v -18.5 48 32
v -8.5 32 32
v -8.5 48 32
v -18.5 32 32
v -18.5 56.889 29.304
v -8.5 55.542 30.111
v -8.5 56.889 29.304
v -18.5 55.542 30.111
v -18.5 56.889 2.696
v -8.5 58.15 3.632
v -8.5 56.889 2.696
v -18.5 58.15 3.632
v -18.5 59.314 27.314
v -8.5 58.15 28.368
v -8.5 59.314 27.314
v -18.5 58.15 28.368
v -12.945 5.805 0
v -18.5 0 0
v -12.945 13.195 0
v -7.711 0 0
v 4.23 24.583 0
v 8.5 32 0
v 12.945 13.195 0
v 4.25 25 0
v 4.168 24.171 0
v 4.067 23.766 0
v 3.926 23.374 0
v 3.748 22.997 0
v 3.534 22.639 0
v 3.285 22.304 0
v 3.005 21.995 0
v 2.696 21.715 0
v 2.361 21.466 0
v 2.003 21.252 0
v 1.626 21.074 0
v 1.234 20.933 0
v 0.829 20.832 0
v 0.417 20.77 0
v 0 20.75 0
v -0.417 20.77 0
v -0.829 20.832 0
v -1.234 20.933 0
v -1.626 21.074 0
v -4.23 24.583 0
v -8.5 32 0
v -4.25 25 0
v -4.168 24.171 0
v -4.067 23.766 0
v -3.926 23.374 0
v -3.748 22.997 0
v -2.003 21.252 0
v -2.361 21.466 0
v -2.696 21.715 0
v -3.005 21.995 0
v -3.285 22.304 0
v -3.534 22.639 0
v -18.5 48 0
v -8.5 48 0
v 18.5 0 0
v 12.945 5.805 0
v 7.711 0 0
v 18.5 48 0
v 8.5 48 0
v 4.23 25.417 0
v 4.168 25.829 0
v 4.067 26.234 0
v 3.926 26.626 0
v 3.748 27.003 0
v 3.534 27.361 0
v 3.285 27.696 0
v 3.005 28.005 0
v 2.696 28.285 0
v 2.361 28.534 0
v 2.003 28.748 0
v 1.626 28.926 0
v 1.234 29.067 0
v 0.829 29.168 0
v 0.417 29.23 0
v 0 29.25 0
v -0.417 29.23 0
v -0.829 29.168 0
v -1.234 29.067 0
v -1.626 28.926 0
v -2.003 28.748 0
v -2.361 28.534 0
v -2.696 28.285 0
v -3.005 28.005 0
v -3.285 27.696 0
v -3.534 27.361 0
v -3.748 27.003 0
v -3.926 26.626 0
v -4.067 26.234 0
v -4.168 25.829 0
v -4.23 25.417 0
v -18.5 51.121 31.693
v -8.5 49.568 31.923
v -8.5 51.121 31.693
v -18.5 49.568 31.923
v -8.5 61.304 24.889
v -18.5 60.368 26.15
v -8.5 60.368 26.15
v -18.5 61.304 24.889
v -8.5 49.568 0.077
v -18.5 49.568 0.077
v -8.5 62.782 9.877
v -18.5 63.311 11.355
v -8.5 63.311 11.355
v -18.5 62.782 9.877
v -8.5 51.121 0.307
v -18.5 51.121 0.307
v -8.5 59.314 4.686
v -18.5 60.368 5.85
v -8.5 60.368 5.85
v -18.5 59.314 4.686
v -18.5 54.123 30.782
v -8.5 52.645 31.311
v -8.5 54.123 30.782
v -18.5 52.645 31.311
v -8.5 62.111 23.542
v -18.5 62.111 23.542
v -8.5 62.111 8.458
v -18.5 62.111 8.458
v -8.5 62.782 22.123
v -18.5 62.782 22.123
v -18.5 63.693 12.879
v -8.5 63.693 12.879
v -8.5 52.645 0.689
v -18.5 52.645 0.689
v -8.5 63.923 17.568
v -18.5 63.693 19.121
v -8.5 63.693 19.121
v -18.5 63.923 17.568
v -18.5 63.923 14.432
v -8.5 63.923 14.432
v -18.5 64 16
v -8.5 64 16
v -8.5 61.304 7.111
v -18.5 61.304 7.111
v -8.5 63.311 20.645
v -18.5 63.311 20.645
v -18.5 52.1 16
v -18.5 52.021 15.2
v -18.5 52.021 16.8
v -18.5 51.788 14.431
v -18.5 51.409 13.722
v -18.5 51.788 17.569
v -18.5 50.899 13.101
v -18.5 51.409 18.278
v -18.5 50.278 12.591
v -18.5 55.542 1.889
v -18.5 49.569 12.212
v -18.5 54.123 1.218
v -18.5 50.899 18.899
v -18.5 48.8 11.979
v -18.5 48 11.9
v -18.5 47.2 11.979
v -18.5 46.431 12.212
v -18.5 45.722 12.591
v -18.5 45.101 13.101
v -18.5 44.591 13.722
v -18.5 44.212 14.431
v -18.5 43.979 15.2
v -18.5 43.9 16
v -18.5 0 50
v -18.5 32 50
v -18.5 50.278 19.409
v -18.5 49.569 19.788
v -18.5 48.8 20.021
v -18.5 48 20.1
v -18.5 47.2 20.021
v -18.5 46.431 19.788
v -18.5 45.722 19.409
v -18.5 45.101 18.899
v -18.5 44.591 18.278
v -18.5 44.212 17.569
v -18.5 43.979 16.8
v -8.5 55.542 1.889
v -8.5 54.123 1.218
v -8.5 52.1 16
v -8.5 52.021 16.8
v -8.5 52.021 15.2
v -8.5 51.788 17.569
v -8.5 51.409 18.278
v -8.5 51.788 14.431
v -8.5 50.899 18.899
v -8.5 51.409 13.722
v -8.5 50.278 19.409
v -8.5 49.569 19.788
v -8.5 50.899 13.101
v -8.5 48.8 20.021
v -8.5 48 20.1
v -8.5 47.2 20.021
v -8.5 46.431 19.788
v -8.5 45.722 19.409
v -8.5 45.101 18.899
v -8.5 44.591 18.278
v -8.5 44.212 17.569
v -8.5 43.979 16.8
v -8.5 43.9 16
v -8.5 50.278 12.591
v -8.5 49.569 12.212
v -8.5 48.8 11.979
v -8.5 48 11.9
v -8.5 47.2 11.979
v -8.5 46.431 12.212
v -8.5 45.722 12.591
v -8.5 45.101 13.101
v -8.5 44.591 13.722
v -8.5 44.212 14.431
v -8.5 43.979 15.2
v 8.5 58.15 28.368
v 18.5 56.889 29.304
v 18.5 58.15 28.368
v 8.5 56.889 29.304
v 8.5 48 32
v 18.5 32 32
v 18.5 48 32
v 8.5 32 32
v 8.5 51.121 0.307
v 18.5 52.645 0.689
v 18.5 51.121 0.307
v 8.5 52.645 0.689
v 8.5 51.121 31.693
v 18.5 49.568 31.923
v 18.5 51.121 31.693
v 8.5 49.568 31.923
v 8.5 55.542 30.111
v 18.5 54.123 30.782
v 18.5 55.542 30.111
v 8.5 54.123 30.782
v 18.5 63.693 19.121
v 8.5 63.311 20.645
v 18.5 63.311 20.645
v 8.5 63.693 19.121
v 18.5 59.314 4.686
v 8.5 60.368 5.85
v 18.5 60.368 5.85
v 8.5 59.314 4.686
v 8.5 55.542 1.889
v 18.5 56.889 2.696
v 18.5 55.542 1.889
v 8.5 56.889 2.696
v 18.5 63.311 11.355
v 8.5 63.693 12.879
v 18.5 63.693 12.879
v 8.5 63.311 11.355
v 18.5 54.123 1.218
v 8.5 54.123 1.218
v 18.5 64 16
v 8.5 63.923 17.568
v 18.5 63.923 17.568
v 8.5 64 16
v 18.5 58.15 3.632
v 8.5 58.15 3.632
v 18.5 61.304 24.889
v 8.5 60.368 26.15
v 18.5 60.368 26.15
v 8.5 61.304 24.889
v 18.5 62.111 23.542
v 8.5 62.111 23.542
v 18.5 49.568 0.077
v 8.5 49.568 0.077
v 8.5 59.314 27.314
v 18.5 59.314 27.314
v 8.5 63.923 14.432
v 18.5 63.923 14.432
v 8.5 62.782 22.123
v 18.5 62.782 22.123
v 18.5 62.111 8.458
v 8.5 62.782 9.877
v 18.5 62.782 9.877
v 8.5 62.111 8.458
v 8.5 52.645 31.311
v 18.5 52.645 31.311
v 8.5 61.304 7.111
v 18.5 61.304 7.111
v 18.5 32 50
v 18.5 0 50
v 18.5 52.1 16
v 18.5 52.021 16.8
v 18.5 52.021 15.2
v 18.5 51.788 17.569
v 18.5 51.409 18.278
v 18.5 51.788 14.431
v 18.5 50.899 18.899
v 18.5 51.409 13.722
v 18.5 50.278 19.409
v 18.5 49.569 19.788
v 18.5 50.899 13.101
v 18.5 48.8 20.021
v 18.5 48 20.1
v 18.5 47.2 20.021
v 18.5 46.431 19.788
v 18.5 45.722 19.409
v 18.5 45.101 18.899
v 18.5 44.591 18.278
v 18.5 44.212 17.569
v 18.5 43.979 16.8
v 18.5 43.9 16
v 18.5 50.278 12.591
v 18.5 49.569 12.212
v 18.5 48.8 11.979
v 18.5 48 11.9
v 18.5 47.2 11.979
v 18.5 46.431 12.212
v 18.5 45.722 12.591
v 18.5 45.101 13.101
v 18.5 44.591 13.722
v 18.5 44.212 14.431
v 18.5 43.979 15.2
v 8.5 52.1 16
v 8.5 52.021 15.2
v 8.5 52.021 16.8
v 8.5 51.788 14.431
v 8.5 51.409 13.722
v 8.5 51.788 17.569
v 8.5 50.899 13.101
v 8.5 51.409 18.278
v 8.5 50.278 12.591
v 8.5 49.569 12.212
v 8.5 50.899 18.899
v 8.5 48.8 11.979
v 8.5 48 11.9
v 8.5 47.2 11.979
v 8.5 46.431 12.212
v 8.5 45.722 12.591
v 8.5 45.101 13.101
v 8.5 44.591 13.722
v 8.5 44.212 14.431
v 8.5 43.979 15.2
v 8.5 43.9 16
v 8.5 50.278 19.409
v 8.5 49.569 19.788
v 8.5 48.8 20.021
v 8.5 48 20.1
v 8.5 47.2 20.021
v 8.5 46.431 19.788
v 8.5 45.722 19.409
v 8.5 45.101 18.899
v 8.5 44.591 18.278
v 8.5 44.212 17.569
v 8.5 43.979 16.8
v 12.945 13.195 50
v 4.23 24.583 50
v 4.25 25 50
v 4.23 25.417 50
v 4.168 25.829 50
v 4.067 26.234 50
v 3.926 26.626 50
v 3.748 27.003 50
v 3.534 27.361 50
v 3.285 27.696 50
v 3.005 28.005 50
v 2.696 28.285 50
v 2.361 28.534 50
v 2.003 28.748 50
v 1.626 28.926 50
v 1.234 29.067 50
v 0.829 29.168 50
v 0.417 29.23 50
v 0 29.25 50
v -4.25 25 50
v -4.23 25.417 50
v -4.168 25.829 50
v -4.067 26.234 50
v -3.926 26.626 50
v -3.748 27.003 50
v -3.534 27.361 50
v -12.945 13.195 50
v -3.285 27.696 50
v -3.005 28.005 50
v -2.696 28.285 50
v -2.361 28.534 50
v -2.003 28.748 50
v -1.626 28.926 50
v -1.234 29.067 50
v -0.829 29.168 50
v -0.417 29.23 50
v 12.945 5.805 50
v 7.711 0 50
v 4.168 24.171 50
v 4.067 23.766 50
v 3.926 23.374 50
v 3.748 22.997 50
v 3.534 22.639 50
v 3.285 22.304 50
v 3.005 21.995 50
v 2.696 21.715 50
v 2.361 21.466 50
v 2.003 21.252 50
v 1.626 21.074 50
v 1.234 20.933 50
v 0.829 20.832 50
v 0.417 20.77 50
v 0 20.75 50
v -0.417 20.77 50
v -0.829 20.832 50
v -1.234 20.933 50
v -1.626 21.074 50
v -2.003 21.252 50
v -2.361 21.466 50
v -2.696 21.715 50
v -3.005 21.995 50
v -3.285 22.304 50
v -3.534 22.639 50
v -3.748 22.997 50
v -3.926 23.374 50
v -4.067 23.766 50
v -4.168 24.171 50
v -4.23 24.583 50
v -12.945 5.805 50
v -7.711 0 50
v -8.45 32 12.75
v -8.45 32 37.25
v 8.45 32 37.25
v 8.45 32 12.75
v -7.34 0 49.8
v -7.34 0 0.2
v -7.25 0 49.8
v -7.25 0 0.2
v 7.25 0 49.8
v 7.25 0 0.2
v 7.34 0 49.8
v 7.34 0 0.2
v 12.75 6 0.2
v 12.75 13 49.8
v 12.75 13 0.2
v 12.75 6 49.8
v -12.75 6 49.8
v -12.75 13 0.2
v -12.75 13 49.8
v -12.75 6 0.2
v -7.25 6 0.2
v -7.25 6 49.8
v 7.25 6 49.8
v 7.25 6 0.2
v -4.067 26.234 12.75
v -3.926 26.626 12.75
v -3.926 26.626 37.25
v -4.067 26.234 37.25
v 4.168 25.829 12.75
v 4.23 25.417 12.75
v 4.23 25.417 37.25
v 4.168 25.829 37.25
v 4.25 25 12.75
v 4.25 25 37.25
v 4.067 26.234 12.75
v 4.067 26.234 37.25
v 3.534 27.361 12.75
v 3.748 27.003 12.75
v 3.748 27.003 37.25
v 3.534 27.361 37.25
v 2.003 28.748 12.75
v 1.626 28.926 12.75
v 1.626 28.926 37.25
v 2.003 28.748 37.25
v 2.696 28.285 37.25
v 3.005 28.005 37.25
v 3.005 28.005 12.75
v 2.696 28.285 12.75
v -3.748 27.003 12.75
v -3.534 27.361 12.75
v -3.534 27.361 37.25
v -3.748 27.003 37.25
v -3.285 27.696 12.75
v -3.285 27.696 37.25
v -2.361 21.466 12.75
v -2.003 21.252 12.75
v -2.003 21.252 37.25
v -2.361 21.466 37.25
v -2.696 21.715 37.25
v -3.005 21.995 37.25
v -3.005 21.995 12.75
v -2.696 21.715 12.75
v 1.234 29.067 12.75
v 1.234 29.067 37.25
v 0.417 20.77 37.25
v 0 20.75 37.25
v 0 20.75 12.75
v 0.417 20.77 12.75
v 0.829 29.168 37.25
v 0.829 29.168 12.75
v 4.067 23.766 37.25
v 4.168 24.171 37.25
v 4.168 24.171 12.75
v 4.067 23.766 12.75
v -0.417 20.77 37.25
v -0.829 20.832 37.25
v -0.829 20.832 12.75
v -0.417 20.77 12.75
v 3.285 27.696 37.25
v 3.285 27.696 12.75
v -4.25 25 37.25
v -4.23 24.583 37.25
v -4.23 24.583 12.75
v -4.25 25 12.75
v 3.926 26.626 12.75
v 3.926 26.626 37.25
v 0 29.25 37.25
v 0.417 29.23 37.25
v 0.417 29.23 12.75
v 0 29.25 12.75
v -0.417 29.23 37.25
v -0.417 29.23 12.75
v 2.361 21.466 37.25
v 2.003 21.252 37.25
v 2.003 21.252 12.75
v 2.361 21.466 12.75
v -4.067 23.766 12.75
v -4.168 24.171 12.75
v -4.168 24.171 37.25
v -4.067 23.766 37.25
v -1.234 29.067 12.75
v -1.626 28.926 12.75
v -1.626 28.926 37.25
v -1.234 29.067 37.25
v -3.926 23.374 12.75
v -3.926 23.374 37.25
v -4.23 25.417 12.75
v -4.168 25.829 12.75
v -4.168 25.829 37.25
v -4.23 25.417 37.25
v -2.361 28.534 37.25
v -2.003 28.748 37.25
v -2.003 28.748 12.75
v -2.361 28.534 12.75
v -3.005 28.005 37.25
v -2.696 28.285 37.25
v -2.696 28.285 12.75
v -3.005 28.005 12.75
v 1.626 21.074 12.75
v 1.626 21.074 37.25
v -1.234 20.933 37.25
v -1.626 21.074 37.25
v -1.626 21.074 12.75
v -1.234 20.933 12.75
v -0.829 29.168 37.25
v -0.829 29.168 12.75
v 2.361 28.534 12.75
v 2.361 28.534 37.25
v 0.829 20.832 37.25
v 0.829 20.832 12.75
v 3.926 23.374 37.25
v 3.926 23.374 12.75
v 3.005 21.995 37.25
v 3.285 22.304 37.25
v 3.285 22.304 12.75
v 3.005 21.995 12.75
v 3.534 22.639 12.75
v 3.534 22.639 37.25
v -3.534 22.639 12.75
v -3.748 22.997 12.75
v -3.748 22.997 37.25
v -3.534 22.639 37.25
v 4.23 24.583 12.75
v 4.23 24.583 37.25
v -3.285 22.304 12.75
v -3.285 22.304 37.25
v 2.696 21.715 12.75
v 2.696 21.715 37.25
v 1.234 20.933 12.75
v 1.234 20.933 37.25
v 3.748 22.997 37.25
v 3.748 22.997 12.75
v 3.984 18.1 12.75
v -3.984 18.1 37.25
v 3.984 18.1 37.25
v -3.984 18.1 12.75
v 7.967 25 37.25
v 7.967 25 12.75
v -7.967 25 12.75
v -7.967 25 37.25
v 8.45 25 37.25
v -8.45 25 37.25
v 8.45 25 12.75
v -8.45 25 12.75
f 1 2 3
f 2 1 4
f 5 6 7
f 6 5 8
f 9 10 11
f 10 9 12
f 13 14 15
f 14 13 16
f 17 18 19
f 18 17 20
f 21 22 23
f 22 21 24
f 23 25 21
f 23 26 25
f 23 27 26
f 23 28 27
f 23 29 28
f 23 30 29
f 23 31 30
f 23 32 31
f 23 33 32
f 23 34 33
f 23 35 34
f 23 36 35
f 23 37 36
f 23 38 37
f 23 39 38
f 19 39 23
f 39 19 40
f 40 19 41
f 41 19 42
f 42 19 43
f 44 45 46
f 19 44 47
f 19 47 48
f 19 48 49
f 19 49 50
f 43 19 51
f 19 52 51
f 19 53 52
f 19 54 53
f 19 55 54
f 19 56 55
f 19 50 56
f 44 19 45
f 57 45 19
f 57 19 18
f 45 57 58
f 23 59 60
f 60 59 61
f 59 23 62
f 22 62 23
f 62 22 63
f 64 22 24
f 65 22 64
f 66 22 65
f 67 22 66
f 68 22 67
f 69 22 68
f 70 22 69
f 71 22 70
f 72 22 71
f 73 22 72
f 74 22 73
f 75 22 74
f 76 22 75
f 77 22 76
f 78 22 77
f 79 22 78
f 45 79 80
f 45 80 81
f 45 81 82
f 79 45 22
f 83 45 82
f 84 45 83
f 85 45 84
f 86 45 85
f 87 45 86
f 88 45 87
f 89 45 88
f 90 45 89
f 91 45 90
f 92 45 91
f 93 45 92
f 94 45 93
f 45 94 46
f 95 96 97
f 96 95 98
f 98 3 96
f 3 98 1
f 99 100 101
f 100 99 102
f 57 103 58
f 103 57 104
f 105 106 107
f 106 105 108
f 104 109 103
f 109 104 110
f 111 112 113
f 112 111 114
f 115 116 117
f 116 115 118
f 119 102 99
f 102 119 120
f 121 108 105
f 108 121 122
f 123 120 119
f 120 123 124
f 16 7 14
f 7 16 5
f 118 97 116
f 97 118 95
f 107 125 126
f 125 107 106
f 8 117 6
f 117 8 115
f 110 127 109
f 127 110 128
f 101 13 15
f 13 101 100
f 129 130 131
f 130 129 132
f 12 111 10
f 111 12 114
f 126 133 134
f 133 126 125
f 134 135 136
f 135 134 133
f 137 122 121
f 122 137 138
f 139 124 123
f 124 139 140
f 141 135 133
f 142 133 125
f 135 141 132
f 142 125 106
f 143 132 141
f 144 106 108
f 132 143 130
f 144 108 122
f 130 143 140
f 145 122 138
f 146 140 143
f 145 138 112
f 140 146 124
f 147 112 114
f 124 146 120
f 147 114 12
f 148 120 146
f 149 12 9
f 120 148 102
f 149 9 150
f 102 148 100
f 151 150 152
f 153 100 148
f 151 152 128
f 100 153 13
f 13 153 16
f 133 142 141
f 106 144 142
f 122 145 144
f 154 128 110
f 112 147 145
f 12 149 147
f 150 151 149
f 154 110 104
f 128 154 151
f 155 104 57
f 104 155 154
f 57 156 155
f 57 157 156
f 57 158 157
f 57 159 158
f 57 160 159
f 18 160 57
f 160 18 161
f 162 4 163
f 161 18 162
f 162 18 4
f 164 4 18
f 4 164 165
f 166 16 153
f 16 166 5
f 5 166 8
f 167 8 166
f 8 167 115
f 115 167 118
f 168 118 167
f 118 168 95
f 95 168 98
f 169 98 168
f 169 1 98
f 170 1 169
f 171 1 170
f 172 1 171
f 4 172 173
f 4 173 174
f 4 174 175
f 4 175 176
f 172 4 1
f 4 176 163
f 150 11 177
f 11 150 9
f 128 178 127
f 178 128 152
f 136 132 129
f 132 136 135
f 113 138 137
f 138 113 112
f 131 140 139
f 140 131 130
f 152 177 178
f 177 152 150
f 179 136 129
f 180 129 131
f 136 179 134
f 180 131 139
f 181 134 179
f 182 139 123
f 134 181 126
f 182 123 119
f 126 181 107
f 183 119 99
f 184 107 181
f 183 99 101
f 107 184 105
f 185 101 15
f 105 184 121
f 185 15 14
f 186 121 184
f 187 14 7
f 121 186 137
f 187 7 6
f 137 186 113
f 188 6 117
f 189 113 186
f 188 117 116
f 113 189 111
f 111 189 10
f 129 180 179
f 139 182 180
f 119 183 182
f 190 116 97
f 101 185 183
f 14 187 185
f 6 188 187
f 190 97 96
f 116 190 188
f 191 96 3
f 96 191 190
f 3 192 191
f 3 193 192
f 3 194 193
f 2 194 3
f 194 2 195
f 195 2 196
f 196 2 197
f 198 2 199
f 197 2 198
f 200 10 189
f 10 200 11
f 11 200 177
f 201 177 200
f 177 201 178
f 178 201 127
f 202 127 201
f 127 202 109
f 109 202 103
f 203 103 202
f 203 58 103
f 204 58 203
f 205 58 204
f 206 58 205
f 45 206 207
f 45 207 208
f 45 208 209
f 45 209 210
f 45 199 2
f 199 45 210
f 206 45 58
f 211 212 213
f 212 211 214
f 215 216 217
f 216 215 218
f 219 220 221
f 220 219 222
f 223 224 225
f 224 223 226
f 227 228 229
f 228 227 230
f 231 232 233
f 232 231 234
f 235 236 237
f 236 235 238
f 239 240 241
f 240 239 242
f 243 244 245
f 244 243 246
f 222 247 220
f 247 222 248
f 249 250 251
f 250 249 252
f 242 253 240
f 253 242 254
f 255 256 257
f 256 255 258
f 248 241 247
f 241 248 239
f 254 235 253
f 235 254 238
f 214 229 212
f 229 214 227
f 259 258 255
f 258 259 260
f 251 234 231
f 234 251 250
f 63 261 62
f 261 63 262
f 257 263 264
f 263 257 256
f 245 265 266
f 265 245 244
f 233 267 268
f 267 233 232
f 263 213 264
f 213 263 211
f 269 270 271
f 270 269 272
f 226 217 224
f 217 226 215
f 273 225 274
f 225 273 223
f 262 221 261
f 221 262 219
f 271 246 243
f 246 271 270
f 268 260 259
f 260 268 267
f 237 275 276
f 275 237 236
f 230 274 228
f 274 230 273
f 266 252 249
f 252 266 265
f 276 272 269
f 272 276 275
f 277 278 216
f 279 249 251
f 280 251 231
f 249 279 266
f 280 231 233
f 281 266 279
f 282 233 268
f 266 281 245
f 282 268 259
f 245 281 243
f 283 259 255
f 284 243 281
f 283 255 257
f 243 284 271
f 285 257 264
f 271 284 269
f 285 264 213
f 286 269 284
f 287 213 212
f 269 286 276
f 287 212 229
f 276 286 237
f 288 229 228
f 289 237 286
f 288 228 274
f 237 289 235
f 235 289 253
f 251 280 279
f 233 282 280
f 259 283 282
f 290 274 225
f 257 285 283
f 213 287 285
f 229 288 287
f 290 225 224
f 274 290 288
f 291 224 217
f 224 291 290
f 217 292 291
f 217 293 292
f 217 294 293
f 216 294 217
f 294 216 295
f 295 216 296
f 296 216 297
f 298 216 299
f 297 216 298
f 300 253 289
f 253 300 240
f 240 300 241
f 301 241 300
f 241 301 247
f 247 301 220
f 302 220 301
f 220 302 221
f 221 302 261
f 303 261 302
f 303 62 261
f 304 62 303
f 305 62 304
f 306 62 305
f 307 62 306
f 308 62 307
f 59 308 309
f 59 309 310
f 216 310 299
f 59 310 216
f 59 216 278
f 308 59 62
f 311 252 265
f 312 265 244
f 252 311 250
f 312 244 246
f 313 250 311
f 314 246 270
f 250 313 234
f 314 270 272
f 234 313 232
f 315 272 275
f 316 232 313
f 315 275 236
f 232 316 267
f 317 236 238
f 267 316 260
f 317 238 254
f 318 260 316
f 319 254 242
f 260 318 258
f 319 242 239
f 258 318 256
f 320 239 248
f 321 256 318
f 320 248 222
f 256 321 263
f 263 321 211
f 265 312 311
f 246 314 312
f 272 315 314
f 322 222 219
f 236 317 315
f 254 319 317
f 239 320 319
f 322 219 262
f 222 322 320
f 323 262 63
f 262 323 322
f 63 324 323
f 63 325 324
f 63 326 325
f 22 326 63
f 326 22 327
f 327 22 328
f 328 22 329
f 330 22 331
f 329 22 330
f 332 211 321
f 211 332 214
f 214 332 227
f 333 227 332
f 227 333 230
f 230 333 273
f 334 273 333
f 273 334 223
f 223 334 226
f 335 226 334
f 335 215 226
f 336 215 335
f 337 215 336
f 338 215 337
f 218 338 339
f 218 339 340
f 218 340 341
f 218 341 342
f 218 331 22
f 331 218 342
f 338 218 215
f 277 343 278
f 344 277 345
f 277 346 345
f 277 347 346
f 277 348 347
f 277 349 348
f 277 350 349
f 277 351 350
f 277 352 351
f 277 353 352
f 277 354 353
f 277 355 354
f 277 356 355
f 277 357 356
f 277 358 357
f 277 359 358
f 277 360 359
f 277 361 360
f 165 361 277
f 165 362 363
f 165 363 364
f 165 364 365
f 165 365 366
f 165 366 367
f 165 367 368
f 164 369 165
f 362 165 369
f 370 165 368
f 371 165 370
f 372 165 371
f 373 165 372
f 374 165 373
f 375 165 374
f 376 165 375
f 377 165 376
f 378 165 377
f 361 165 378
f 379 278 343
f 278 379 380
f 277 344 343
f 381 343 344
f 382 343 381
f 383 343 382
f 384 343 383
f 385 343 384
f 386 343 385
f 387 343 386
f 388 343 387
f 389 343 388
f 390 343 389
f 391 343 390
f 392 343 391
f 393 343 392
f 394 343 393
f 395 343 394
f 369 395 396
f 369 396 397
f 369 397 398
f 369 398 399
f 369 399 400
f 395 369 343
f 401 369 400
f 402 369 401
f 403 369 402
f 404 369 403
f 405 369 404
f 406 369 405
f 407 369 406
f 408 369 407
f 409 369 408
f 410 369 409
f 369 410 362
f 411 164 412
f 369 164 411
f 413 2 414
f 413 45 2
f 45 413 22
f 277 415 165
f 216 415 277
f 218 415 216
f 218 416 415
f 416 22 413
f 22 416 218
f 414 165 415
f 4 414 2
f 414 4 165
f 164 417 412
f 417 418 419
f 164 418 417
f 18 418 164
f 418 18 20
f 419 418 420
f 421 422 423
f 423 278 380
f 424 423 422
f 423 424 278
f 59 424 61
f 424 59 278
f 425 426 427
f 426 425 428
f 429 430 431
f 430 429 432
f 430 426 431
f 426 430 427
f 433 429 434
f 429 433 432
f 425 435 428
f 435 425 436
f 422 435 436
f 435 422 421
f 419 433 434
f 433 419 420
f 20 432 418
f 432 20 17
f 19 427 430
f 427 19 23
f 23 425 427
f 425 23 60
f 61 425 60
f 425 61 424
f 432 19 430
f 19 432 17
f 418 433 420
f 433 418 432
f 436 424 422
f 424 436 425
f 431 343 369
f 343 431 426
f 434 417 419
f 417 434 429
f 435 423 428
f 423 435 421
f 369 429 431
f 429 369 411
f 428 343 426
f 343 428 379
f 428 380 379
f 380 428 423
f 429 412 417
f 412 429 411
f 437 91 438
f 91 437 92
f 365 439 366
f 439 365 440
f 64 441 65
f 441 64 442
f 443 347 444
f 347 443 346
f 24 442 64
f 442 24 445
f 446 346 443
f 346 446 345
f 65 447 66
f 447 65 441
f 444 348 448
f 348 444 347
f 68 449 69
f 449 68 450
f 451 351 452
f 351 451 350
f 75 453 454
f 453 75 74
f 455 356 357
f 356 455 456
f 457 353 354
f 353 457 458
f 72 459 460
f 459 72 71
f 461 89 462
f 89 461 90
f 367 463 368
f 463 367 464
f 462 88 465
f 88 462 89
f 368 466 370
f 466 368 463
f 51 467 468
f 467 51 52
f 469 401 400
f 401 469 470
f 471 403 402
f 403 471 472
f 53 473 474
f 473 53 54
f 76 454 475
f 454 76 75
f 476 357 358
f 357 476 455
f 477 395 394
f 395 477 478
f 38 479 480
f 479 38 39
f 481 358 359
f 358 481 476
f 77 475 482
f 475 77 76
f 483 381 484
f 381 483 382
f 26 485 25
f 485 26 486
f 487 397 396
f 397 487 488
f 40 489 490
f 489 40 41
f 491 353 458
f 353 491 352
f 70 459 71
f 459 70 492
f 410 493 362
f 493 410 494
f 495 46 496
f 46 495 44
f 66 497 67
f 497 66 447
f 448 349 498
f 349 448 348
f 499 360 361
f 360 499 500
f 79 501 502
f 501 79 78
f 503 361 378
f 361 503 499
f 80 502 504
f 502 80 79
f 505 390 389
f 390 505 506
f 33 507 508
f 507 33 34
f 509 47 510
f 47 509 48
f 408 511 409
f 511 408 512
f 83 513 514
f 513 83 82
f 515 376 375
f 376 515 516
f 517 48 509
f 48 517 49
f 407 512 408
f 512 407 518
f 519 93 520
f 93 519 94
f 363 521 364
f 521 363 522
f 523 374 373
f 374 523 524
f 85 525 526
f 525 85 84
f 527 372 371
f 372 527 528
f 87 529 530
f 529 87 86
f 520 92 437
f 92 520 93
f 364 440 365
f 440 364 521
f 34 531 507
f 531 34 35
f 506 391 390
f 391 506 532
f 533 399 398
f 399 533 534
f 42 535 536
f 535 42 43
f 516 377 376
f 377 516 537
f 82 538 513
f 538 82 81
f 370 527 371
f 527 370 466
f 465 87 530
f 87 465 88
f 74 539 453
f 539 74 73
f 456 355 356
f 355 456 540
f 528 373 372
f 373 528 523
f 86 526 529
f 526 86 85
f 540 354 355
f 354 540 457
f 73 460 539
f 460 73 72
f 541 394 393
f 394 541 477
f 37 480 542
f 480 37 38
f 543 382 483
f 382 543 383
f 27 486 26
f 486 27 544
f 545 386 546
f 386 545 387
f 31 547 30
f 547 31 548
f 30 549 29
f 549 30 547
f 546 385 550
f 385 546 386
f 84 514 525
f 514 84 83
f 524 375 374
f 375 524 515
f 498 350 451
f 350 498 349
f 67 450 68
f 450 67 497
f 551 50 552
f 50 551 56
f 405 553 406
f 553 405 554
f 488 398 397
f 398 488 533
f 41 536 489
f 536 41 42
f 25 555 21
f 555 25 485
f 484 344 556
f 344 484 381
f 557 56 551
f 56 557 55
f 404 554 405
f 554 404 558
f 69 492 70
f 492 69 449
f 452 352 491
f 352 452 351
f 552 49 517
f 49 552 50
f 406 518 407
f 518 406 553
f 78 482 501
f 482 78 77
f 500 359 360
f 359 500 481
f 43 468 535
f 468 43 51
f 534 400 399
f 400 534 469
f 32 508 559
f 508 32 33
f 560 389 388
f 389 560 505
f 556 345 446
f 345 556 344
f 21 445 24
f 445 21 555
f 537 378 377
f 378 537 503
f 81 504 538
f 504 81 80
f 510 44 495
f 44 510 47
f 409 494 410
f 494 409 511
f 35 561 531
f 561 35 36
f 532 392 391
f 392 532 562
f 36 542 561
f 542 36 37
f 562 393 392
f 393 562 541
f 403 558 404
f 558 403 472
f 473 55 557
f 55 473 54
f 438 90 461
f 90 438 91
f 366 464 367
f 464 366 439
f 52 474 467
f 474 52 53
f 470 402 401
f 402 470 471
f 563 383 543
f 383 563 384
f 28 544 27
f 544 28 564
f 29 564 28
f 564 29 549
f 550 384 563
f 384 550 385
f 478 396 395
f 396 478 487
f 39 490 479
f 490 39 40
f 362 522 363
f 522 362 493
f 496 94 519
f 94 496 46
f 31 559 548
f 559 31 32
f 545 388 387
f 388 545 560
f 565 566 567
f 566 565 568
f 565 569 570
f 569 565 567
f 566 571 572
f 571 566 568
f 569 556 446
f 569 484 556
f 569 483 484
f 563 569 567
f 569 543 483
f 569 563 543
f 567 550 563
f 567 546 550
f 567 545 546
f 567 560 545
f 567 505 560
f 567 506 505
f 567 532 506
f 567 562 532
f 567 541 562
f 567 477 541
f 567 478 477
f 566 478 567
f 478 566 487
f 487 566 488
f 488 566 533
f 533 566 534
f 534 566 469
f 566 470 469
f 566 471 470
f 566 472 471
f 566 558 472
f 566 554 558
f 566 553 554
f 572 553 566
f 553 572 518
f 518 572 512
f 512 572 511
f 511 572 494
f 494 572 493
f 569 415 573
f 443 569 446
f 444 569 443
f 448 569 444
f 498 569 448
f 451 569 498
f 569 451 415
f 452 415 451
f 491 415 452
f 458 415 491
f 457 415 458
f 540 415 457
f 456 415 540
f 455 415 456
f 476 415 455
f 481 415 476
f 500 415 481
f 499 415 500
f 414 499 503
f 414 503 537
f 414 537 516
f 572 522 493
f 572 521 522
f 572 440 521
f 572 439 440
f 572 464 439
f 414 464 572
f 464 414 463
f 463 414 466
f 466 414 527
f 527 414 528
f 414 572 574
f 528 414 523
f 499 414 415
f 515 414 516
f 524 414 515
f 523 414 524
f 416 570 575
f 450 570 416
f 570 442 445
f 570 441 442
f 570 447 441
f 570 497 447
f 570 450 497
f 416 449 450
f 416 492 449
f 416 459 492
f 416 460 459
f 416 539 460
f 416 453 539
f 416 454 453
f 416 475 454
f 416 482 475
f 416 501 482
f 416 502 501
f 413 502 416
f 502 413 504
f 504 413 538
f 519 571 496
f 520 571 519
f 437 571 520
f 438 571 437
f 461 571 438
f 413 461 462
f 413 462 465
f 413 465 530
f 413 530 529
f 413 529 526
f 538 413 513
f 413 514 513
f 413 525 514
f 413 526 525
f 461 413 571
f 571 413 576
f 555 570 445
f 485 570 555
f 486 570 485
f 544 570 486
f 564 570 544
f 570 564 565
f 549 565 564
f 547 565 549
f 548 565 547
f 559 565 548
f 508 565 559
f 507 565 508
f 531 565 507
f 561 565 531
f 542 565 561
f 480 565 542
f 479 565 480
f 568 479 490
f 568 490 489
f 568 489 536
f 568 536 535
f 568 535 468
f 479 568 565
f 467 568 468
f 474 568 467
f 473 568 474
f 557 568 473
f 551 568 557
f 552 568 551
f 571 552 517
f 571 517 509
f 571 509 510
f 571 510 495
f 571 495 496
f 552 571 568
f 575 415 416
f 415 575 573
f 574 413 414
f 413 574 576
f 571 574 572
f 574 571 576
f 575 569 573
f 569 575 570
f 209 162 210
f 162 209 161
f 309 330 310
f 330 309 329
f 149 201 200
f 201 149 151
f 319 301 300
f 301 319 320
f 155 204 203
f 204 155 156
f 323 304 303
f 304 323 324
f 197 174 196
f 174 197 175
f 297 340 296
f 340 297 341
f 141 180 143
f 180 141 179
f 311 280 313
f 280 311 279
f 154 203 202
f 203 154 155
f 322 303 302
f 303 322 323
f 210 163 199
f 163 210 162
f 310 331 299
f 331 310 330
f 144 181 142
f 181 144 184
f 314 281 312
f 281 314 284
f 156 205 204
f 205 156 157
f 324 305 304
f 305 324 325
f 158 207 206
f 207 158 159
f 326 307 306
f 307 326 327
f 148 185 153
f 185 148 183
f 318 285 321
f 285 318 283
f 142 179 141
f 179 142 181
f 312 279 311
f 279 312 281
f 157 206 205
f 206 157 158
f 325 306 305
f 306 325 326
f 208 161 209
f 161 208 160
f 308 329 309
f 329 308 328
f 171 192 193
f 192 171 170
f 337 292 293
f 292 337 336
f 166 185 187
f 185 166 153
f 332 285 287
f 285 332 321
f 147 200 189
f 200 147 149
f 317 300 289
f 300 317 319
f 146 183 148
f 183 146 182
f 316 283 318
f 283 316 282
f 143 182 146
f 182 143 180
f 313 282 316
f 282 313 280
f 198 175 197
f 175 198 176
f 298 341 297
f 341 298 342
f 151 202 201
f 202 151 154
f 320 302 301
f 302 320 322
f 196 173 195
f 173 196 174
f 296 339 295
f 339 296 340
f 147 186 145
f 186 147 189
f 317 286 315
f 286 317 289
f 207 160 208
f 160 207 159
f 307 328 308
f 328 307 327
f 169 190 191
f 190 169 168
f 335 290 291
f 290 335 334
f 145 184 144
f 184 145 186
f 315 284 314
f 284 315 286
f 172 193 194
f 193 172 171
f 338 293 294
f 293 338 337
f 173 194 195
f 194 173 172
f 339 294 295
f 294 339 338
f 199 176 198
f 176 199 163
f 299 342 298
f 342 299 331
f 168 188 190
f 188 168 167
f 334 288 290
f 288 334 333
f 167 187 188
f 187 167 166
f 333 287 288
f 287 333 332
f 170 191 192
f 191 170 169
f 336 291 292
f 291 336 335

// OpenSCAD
// PROJECT: NEMA17 Solar Adjuster (Todmorden)
// PART: Narrow Reinforced Slider (4mm RADIUS ENTRY/EXIT CHAMFER)

$fn = 64;

/* [Rail & Body Dimensions] */
slider_length = 50;     
rail_top_width = 25.5;  
rail_flange_thick = 7.0; 
web_gap = 14.5;         
rail_total_depth = 22.4; 
flare_size = 4.0;       // INCREASED TO 4mm RADIUS CHAMFER

/* [Nut & Rod Settings] */
nut_flat_to_flat = 13.4;   
nut_length = 24.5;         
rod_diameter = 8.5;        
print_tolerance = 0.4;     

/* [Lugs & Pivot] */
lug_width = 10;      
lug_gap = 17.0;      
pivot_z_pos = 16;    
lug_radius = 16;     
hole_y_offset = lug_radius; 

// Helper to render the T-shape for the hull-chamfer
module render_t_profile(h_val, flare=0) {
    // Top of T (Flange)
    translate([-(rail_top_width+flare*2)/2, 6-flare, 0]) 
        cube([rail_top_width+flare*2, rail_flange_thick+flare*2, h_val]);
    // Stem of T (Web)
    translate([-(web_gap+flare*2)/2, -0.1-flare, 0]) 
        cube([web_gap+flare*2, 10+flare*2, h_val]);
}

module final_chamfered_slider() {
    body_depth = 32; 
    body_width = 37; 
    
    difference() {
        union() {
            // MAIN BODY
            translate([-body_width/2, 0, 0]) 
                cube([body_width, body_depth, slider_length]); 
            
            // COMPACT PIVOT LUGS
            for(side = [-1, 1]) {
                hull() {
                    translate([(side * (lug_gap/2 + lug_width/2)) - lug_width/2, body_depth - 1, 0])
                        cube([lug_width, 1, 32]);
                    
                    translate([(side * (lug_gap/2 + lug_width/2)), body_depth + hole_y_offset, pivot_z_pos])
                        rotate([0, 90, 0])
                            cylinder(d=lug_radius*2, h=lug_width, center=true);
                }
            }
        }

        // 1. RAIL CHANNEL WITH 4mm RADIUS CHAMFERS
        union() {
            // Main Constant Rail Profile (Horizontal axis)
            translate([0, 0, -1]) {
                translate([-rail_top_width/2, 6, 0]) 
                    cube([rail_top_width, rail_flange_thick, slider_length + 2]);
                translate([-web_gap/2, -0.1, 0]) 
                    cube([web_gap, 10, slider_length + 2]);
            }
            
            // Chamfers at both ends (Entrance and Exit)
            for(z_pos = [0, slider_length]) {
                translate([0, 0, z_pos])
                mirror([0, 0, (z_pos == 0 ? 0 : 1)])
                hull() {
                    // Internal Start (Standard size)
                    translate([0, 0, 0.1])
                        render_t_profile(0.1);
                    
                    // External Flare (4mm flare over 4mm depth)
                    translate([0, 0, -flare_size])
                        render_t_profile(0.1, flare=flare_size);
                }
            }
        }

        // 2. ROD & NUT TRAP (Top Loading)
        translate([0, 25, slider_length/2]) { 
            cylinder(d=rod_diameter, h=slider_length + 10, center=true);
            rotate([0, 0, 0])
                cylinder(d=(nut_flat_to_flat + print_tolerance) / cos(30), h=nut_length, $fn=6, center=true);
            translate([0, 10, 0])
                cube([nut_flat_to_flat + print_tolerance +3.1, 20, nut_length], center=true);
        }
        
        // 3. PIVOT HOLE
        translate([-50, body_depth + hole_y_offset, pivot_z_pos])
            rotate([0, 90, 0])
                cylinder(d=8.2, h=100, $fn=32);
    }
}

final_chamfered_slider();
